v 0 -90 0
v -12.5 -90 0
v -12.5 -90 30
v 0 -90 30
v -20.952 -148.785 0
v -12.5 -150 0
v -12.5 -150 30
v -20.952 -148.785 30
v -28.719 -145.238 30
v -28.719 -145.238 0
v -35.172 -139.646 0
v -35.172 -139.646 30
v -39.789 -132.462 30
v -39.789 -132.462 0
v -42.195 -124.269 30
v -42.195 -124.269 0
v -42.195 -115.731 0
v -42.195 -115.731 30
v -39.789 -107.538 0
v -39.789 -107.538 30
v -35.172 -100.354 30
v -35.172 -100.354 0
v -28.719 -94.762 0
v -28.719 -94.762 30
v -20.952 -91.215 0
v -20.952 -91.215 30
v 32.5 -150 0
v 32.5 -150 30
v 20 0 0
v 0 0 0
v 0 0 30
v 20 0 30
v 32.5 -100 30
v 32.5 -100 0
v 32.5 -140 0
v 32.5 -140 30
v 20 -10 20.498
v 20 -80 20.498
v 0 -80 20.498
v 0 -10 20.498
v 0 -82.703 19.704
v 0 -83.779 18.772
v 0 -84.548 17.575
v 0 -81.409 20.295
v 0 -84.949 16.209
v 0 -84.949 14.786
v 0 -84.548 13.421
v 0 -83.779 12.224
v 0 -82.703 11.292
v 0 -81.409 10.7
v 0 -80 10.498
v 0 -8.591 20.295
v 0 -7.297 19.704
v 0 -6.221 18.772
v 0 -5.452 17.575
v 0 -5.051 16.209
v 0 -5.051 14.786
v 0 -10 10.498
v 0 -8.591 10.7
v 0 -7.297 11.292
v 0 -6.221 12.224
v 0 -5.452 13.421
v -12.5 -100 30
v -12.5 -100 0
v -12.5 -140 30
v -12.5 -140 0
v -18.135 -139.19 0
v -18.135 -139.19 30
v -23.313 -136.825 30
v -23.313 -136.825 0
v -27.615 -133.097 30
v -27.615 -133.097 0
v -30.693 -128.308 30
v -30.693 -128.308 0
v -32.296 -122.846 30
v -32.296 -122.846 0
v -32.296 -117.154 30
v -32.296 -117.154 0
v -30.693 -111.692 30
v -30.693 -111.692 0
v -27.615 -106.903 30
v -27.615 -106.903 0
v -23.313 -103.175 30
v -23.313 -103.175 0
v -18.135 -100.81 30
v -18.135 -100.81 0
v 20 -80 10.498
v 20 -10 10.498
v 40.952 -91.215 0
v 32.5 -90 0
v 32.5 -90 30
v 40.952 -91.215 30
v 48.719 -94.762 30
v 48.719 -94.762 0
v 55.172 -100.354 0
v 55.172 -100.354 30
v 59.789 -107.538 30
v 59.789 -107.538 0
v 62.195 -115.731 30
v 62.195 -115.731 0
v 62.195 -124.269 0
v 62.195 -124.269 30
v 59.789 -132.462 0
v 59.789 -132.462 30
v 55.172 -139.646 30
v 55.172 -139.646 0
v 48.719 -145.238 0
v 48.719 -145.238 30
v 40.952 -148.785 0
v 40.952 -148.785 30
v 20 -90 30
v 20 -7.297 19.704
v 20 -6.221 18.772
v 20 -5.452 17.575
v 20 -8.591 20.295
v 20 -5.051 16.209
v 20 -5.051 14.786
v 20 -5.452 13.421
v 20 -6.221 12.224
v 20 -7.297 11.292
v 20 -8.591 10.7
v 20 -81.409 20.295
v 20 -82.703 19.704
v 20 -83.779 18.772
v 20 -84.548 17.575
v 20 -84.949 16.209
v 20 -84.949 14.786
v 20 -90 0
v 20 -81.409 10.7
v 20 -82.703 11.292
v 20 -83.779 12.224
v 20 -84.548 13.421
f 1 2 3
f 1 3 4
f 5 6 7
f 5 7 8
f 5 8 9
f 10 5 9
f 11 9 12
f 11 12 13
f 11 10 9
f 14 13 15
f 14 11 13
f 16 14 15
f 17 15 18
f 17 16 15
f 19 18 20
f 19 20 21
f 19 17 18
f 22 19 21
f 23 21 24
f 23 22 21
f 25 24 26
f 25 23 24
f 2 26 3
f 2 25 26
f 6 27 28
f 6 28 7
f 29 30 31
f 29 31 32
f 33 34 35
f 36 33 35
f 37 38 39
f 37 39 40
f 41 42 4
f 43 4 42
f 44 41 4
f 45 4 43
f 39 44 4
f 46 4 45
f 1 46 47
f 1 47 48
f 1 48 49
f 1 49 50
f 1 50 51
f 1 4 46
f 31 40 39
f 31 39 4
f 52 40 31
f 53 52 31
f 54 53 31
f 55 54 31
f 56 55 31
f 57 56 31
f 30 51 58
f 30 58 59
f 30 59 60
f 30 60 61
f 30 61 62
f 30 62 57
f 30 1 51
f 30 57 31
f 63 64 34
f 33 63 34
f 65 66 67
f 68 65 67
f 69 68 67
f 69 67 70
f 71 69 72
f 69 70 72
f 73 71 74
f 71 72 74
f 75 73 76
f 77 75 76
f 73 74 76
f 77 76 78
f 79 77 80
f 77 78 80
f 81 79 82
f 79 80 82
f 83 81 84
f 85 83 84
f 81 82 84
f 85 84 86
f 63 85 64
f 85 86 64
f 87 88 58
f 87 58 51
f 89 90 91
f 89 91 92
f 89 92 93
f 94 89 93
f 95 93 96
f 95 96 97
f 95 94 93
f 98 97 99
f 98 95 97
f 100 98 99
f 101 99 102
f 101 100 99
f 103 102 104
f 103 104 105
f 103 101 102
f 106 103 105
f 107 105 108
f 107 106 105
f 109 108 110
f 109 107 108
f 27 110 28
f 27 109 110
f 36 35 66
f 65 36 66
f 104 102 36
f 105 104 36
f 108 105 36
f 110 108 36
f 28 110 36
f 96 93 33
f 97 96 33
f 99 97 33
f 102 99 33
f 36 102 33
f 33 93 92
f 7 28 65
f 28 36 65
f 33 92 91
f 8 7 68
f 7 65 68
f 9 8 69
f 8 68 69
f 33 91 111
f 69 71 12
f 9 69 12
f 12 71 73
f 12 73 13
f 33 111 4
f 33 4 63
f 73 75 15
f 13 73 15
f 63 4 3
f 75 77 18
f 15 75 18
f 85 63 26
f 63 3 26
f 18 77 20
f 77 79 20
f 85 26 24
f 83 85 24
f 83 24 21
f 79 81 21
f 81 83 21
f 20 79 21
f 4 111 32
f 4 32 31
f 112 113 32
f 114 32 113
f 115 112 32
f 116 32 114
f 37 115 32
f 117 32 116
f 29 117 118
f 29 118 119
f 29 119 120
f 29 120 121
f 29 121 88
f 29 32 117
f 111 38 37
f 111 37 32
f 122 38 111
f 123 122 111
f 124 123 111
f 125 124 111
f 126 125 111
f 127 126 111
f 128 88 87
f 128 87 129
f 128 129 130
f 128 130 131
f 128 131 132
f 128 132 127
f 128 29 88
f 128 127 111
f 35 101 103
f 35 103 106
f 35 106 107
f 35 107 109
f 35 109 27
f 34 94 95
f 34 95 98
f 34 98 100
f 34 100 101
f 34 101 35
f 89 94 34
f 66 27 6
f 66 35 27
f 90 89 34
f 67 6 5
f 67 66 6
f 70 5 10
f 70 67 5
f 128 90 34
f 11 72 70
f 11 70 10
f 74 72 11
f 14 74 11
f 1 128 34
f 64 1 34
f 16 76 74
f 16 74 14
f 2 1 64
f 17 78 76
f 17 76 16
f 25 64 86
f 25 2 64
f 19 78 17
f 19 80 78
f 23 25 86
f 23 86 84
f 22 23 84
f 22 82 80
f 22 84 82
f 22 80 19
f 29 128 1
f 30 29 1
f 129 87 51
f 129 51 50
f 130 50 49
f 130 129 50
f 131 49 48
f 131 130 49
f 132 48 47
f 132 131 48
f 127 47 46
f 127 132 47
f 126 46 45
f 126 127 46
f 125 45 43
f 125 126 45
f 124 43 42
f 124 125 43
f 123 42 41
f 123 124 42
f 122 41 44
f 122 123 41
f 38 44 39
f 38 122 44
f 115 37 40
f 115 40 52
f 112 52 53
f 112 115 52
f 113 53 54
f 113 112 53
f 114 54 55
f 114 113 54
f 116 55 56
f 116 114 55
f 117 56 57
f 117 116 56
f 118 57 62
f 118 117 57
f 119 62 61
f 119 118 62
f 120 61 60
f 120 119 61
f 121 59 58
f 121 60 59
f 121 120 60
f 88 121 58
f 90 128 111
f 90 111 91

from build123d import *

# Parameters (mm, degrees)
SALIENTE_EXTRUIR1_DEPTH = 30
CORTAR_EXTRUIR1_DEPTH   = 30


with BuildPart() as part:
    # Croquis1 → Saliente-Extruir1 (new body)
    with BuildSketch(Plane.XY):
        with BuildLine():
            Line((0, 0), (20, 0))
            Line((20, 0), (20, -90))
            Line((20, -90), (32.5, -90))
            ThreePointArc((32.5, -90), (62.5, -120), (32.5, -150))
            Line((32.5, -150), (-12.5, -150))
            ThreePointArc((-12.5, -150), (-42.5, -120), (-12.5, -90))
            Line((-12.5, -90), (0, -90))
            Line((0, -90), (0, 0))
        make_face()
        with BuildLine():
            Line((32.5, -140), (-12.5, -140))
            ThreePointArc((-12.5, -140), (-32.5, -120), (-12.5, -100))
            Line((-12.5, -100), (32.5, -100))
            Line((32.5, -100), (32.5, -140))
        make_face(mode=Mode.SUBTRACT)
    extrude(amount=SALIENTE_EXTRUIR1_DEPTH)

    # Croquis3 → Cortar-Extruir1 (cut)
    with BuildSketch(Plane(origin=(20, 0, 0), x_dir=(0, 0, -1), z_dir=(1, 0, 0))):
        with BuildLine():
            Line((-10.497811767, -10), (-10.497811767, -80))
            ThreePointArc((-10.497811767, -80), (-15.497811767, -85), (-20.497811767, -80))
            Line((-20.497811767, -80), (-20.497811767, -10))
            ThreePointArc((-20.497811767, -10), (-15.497811767, -5), (-10.497811767, -10))
        make_face()
    extrude(amount=-CORTAR_EXTRUIR1_DEPTH, mode=Mode.SUBTRACT)


solid = part.part
